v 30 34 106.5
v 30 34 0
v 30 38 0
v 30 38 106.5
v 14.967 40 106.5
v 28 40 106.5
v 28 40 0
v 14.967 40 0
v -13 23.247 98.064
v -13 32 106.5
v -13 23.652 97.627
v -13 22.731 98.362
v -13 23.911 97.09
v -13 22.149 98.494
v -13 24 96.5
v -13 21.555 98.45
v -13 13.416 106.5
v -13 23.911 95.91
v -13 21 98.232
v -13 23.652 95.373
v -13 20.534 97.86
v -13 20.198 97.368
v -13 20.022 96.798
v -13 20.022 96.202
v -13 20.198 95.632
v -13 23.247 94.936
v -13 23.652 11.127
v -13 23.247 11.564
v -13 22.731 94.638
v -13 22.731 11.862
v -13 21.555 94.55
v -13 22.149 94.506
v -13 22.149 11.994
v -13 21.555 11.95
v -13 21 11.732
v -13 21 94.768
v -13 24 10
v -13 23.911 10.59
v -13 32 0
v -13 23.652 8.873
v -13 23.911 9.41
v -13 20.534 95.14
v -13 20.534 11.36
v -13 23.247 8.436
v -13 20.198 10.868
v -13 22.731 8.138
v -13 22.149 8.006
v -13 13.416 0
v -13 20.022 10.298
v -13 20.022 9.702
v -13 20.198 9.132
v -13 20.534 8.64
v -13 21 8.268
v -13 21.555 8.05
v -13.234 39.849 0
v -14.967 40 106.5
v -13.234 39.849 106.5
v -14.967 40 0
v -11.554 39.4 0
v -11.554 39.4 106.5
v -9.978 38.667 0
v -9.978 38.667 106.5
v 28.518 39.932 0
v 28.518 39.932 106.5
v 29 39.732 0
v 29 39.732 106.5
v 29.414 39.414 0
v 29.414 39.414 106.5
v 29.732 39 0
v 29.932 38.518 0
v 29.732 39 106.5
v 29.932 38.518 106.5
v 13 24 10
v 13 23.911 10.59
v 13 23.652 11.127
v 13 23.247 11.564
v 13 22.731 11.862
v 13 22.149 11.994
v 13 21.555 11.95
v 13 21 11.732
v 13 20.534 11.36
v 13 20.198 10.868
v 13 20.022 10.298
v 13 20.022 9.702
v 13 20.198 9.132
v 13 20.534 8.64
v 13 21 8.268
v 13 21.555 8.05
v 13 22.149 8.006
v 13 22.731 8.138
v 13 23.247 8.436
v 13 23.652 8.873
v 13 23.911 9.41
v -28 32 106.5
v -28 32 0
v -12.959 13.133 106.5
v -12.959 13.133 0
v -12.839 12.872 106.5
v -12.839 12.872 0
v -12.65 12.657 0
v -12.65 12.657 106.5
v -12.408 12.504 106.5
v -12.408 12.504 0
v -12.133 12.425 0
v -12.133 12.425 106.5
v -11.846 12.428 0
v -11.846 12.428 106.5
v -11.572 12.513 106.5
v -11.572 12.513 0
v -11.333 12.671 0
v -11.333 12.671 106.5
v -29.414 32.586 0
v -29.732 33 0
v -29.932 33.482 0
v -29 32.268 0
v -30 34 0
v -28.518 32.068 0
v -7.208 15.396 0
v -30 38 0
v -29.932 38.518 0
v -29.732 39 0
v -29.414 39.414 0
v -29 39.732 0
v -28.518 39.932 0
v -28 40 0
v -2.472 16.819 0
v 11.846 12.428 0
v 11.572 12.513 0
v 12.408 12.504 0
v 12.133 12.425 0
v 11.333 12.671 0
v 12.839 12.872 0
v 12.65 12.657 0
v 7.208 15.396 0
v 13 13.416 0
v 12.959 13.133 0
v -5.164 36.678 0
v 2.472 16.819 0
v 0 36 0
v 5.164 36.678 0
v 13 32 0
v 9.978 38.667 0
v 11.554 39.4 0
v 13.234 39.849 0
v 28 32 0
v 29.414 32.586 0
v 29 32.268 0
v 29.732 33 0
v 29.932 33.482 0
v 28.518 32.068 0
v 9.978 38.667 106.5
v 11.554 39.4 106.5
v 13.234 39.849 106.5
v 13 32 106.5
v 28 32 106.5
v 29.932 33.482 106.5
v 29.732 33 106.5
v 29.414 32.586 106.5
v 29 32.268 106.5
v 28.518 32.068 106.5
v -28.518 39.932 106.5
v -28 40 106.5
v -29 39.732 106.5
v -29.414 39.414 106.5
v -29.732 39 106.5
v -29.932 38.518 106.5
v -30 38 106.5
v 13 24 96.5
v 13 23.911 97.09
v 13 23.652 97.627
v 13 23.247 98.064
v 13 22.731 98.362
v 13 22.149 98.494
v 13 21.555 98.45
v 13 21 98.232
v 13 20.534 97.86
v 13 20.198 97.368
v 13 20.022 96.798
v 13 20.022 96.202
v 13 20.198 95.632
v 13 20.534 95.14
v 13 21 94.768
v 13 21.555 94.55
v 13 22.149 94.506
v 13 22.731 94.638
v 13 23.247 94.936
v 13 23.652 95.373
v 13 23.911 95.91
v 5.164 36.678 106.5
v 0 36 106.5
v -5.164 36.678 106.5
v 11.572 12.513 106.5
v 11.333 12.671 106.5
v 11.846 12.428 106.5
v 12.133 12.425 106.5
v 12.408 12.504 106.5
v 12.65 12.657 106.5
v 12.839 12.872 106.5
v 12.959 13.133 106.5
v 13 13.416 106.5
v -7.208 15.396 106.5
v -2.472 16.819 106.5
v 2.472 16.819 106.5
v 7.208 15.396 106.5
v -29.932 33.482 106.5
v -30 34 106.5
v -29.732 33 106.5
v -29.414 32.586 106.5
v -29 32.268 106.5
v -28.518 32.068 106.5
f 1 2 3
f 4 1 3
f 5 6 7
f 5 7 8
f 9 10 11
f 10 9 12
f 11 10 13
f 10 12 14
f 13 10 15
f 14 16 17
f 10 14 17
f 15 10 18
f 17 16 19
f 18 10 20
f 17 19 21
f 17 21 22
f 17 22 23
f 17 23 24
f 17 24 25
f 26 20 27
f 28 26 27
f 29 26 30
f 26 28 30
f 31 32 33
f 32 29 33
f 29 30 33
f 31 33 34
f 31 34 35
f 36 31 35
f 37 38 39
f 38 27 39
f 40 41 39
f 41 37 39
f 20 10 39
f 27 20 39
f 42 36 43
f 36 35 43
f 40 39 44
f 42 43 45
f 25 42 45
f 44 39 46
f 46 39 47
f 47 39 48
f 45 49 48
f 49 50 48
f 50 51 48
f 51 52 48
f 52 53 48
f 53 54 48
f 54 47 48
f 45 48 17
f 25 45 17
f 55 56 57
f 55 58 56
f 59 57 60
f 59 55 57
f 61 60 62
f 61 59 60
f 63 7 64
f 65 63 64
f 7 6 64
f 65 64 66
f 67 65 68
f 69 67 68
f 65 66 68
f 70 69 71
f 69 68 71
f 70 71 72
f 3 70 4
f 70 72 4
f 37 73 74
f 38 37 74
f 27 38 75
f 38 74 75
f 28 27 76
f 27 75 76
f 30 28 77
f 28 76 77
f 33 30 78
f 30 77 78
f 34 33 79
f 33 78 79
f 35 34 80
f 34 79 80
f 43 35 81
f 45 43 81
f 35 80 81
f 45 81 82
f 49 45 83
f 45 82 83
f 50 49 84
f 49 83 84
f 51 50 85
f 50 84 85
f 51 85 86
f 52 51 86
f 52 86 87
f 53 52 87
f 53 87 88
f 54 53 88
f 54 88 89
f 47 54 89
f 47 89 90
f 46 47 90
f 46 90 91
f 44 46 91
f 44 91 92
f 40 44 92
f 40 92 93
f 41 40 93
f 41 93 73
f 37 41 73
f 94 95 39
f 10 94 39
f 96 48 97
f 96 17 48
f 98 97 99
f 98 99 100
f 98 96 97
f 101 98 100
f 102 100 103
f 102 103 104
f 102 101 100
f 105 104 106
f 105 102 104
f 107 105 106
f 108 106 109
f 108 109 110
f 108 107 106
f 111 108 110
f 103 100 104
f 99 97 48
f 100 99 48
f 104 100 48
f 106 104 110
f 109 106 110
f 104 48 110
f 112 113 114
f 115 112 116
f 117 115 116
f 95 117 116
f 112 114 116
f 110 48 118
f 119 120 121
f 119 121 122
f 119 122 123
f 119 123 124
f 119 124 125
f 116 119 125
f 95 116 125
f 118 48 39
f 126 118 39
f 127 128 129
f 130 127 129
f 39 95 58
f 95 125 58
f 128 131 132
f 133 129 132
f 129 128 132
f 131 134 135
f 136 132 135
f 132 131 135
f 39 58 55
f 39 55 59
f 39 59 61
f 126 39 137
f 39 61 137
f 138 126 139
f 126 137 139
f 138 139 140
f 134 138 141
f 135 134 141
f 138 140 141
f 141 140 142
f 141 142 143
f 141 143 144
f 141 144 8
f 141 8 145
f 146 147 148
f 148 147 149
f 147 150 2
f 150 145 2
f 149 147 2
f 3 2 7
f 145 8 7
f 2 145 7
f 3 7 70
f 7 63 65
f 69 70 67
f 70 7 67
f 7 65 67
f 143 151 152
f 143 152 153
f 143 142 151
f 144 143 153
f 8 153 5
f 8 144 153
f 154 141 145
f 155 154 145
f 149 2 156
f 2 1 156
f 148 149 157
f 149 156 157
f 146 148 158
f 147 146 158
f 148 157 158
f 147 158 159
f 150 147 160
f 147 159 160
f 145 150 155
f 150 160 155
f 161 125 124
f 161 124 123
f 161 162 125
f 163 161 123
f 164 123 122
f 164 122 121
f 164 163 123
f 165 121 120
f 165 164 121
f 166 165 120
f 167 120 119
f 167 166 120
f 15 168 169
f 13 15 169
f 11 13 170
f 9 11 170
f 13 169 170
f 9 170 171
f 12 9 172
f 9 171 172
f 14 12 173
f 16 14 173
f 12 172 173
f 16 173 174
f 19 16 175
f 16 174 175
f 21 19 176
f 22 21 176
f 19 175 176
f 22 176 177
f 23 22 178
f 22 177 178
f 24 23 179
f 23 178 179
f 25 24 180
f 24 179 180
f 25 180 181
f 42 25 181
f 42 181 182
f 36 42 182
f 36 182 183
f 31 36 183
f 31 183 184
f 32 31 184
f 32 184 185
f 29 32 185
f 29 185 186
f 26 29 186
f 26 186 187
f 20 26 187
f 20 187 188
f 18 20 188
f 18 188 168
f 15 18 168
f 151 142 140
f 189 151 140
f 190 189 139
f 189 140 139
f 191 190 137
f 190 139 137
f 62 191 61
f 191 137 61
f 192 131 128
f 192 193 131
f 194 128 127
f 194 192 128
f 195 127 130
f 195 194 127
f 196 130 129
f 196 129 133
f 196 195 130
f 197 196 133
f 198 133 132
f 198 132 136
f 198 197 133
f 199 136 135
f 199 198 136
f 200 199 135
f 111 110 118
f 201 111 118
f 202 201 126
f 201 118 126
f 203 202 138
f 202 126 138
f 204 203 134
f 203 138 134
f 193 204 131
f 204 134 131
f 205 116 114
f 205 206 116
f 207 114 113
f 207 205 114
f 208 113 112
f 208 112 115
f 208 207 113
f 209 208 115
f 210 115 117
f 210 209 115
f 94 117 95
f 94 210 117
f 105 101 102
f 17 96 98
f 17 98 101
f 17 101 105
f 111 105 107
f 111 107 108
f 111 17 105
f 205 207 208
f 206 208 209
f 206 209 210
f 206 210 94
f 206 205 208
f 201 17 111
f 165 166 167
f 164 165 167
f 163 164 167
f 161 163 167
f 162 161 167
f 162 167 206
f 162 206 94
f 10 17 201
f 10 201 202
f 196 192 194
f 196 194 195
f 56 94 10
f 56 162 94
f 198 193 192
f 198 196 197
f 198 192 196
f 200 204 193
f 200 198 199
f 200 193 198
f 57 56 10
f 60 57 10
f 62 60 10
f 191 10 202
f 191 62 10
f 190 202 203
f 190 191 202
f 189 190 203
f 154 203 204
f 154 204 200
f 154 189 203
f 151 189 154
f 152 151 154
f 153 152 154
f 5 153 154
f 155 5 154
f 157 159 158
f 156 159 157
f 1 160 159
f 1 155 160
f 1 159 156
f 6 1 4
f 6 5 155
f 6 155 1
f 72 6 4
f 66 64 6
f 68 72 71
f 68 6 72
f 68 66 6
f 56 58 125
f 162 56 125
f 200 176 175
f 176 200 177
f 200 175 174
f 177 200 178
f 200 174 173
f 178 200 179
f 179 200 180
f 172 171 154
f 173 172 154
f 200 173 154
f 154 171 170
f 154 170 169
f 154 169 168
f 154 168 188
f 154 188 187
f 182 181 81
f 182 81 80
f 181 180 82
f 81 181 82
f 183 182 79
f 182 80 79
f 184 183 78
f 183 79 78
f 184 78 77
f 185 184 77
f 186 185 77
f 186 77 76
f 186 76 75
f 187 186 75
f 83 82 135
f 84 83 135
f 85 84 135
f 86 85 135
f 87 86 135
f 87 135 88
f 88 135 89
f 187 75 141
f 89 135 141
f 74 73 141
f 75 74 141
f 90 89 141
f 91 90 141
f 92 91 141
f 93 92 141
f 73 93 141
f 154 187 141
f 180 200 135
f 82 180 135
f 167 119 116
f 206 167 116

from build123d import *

# Parameters (mm, degrees)
AUFSATZ_LINEAR_AUSTRAGEN1_DEPTH = 106.5
SKIZZE2_R                       = 20
SCHNITT_LINEAR_AUSTRAGEN1_DEPTH = 118.653091757
VERRUNDUNG1_R                   = 10
VERRUNDUNG2_R                   = 2
VERRUNDUNG3_R                   = 1
SKIZZE3_R                       = 2
SCHNITT_LINEAR_AUSTRAGEN2_DEPTH = 122.619283011


with BuildPart() as part:
    # Skizze1 → Aufsatz-Linear austragen1 (new body)
    with BuildSketch(Plane.XY):
        with BuildLine():
            Line((-30, 32), (-13, 32))
            Line((-13, 32), (-13, 10.95445115))
            ThreePointArc((-13, 10.95445115), (0, 17), (13, 10.95445115))
            Line((13, 10.95445115), (13, 32))
            Line((13, 32), (30, 32))
            Line((30, 32), (30, 40))
            Line((30, 40), (-30, 40))
            Line((-30, 40), (-30, 32))
        make_face()
    extrude(amount=AUFSATZ_LINEAR_AUSTRAGEN1_DEPTH)

    # Skizze2 → Schnitt-Linear austragen1 (cut, through all)
    with BuildSketch(Plane(origin=(0, 0, 0), x_dir=(-1, 0, 0), z_dir=(0, 0, -1))):
        with Locations((0, 56)):
            Circle(SKIZZE2_R)
    extrude(amount=-SCHNITT_LINEAR_AUSTRAGEN1_DEPTH, mode=Mode.SUBTRACT)

    # Verrundung1
    verrundung1_edges = [part.edges().sort_by_distance(p)[0] for p in [
        (-12, 40, 53.25),
        (12, 40, 53.25),
    ]]
    fillet(verrundung1_edges, radius=VERRUNDUNG1_R)

    # Verrundung2
    verrundung2_edges = [part.edges().sort_by_distance(p)[0] for p in [
        (-30, 40, 53.25),
        (30, 40, 53.25),
        (30, 32, 53.25),
        (-30, 32, 53.25),
    ]]
    fillet(verrundung2_edges, radius=VERRUNDUNG2_R)

    # Verrundung3
    verrundung3_edges = [part.edges().sort_by_distance(p)[0] for p in [
        (13, 10.95445115, 53.25),
        (-13, 10.95445115, 53.25),
    ]]
    fillet(verrundung3_edges, radius=VERRUNDUNG3_R)

    # Skizze3 → Schnitt-Linear austragen2 (cut, through all)
    with BuildSketch(Plane(origin=(13, 0, 0), x_dir=(0, 0, -1), z_dir=(1, 0, 0))):
        with Locations(Location((-10, 22, 0), (0, 0, 90))):
            Circle(SKIZZE3_R)
        with Locations(Location((-96.5, 22, 0), (0, 0, 90))):
            Circle(SKIZZE3_R)
    extrude(amount=-SCHNITT_LINEAR_AUSTRAGEN2_DEPTH, mode=Mode.SUBTRACT)


solid = part.part
